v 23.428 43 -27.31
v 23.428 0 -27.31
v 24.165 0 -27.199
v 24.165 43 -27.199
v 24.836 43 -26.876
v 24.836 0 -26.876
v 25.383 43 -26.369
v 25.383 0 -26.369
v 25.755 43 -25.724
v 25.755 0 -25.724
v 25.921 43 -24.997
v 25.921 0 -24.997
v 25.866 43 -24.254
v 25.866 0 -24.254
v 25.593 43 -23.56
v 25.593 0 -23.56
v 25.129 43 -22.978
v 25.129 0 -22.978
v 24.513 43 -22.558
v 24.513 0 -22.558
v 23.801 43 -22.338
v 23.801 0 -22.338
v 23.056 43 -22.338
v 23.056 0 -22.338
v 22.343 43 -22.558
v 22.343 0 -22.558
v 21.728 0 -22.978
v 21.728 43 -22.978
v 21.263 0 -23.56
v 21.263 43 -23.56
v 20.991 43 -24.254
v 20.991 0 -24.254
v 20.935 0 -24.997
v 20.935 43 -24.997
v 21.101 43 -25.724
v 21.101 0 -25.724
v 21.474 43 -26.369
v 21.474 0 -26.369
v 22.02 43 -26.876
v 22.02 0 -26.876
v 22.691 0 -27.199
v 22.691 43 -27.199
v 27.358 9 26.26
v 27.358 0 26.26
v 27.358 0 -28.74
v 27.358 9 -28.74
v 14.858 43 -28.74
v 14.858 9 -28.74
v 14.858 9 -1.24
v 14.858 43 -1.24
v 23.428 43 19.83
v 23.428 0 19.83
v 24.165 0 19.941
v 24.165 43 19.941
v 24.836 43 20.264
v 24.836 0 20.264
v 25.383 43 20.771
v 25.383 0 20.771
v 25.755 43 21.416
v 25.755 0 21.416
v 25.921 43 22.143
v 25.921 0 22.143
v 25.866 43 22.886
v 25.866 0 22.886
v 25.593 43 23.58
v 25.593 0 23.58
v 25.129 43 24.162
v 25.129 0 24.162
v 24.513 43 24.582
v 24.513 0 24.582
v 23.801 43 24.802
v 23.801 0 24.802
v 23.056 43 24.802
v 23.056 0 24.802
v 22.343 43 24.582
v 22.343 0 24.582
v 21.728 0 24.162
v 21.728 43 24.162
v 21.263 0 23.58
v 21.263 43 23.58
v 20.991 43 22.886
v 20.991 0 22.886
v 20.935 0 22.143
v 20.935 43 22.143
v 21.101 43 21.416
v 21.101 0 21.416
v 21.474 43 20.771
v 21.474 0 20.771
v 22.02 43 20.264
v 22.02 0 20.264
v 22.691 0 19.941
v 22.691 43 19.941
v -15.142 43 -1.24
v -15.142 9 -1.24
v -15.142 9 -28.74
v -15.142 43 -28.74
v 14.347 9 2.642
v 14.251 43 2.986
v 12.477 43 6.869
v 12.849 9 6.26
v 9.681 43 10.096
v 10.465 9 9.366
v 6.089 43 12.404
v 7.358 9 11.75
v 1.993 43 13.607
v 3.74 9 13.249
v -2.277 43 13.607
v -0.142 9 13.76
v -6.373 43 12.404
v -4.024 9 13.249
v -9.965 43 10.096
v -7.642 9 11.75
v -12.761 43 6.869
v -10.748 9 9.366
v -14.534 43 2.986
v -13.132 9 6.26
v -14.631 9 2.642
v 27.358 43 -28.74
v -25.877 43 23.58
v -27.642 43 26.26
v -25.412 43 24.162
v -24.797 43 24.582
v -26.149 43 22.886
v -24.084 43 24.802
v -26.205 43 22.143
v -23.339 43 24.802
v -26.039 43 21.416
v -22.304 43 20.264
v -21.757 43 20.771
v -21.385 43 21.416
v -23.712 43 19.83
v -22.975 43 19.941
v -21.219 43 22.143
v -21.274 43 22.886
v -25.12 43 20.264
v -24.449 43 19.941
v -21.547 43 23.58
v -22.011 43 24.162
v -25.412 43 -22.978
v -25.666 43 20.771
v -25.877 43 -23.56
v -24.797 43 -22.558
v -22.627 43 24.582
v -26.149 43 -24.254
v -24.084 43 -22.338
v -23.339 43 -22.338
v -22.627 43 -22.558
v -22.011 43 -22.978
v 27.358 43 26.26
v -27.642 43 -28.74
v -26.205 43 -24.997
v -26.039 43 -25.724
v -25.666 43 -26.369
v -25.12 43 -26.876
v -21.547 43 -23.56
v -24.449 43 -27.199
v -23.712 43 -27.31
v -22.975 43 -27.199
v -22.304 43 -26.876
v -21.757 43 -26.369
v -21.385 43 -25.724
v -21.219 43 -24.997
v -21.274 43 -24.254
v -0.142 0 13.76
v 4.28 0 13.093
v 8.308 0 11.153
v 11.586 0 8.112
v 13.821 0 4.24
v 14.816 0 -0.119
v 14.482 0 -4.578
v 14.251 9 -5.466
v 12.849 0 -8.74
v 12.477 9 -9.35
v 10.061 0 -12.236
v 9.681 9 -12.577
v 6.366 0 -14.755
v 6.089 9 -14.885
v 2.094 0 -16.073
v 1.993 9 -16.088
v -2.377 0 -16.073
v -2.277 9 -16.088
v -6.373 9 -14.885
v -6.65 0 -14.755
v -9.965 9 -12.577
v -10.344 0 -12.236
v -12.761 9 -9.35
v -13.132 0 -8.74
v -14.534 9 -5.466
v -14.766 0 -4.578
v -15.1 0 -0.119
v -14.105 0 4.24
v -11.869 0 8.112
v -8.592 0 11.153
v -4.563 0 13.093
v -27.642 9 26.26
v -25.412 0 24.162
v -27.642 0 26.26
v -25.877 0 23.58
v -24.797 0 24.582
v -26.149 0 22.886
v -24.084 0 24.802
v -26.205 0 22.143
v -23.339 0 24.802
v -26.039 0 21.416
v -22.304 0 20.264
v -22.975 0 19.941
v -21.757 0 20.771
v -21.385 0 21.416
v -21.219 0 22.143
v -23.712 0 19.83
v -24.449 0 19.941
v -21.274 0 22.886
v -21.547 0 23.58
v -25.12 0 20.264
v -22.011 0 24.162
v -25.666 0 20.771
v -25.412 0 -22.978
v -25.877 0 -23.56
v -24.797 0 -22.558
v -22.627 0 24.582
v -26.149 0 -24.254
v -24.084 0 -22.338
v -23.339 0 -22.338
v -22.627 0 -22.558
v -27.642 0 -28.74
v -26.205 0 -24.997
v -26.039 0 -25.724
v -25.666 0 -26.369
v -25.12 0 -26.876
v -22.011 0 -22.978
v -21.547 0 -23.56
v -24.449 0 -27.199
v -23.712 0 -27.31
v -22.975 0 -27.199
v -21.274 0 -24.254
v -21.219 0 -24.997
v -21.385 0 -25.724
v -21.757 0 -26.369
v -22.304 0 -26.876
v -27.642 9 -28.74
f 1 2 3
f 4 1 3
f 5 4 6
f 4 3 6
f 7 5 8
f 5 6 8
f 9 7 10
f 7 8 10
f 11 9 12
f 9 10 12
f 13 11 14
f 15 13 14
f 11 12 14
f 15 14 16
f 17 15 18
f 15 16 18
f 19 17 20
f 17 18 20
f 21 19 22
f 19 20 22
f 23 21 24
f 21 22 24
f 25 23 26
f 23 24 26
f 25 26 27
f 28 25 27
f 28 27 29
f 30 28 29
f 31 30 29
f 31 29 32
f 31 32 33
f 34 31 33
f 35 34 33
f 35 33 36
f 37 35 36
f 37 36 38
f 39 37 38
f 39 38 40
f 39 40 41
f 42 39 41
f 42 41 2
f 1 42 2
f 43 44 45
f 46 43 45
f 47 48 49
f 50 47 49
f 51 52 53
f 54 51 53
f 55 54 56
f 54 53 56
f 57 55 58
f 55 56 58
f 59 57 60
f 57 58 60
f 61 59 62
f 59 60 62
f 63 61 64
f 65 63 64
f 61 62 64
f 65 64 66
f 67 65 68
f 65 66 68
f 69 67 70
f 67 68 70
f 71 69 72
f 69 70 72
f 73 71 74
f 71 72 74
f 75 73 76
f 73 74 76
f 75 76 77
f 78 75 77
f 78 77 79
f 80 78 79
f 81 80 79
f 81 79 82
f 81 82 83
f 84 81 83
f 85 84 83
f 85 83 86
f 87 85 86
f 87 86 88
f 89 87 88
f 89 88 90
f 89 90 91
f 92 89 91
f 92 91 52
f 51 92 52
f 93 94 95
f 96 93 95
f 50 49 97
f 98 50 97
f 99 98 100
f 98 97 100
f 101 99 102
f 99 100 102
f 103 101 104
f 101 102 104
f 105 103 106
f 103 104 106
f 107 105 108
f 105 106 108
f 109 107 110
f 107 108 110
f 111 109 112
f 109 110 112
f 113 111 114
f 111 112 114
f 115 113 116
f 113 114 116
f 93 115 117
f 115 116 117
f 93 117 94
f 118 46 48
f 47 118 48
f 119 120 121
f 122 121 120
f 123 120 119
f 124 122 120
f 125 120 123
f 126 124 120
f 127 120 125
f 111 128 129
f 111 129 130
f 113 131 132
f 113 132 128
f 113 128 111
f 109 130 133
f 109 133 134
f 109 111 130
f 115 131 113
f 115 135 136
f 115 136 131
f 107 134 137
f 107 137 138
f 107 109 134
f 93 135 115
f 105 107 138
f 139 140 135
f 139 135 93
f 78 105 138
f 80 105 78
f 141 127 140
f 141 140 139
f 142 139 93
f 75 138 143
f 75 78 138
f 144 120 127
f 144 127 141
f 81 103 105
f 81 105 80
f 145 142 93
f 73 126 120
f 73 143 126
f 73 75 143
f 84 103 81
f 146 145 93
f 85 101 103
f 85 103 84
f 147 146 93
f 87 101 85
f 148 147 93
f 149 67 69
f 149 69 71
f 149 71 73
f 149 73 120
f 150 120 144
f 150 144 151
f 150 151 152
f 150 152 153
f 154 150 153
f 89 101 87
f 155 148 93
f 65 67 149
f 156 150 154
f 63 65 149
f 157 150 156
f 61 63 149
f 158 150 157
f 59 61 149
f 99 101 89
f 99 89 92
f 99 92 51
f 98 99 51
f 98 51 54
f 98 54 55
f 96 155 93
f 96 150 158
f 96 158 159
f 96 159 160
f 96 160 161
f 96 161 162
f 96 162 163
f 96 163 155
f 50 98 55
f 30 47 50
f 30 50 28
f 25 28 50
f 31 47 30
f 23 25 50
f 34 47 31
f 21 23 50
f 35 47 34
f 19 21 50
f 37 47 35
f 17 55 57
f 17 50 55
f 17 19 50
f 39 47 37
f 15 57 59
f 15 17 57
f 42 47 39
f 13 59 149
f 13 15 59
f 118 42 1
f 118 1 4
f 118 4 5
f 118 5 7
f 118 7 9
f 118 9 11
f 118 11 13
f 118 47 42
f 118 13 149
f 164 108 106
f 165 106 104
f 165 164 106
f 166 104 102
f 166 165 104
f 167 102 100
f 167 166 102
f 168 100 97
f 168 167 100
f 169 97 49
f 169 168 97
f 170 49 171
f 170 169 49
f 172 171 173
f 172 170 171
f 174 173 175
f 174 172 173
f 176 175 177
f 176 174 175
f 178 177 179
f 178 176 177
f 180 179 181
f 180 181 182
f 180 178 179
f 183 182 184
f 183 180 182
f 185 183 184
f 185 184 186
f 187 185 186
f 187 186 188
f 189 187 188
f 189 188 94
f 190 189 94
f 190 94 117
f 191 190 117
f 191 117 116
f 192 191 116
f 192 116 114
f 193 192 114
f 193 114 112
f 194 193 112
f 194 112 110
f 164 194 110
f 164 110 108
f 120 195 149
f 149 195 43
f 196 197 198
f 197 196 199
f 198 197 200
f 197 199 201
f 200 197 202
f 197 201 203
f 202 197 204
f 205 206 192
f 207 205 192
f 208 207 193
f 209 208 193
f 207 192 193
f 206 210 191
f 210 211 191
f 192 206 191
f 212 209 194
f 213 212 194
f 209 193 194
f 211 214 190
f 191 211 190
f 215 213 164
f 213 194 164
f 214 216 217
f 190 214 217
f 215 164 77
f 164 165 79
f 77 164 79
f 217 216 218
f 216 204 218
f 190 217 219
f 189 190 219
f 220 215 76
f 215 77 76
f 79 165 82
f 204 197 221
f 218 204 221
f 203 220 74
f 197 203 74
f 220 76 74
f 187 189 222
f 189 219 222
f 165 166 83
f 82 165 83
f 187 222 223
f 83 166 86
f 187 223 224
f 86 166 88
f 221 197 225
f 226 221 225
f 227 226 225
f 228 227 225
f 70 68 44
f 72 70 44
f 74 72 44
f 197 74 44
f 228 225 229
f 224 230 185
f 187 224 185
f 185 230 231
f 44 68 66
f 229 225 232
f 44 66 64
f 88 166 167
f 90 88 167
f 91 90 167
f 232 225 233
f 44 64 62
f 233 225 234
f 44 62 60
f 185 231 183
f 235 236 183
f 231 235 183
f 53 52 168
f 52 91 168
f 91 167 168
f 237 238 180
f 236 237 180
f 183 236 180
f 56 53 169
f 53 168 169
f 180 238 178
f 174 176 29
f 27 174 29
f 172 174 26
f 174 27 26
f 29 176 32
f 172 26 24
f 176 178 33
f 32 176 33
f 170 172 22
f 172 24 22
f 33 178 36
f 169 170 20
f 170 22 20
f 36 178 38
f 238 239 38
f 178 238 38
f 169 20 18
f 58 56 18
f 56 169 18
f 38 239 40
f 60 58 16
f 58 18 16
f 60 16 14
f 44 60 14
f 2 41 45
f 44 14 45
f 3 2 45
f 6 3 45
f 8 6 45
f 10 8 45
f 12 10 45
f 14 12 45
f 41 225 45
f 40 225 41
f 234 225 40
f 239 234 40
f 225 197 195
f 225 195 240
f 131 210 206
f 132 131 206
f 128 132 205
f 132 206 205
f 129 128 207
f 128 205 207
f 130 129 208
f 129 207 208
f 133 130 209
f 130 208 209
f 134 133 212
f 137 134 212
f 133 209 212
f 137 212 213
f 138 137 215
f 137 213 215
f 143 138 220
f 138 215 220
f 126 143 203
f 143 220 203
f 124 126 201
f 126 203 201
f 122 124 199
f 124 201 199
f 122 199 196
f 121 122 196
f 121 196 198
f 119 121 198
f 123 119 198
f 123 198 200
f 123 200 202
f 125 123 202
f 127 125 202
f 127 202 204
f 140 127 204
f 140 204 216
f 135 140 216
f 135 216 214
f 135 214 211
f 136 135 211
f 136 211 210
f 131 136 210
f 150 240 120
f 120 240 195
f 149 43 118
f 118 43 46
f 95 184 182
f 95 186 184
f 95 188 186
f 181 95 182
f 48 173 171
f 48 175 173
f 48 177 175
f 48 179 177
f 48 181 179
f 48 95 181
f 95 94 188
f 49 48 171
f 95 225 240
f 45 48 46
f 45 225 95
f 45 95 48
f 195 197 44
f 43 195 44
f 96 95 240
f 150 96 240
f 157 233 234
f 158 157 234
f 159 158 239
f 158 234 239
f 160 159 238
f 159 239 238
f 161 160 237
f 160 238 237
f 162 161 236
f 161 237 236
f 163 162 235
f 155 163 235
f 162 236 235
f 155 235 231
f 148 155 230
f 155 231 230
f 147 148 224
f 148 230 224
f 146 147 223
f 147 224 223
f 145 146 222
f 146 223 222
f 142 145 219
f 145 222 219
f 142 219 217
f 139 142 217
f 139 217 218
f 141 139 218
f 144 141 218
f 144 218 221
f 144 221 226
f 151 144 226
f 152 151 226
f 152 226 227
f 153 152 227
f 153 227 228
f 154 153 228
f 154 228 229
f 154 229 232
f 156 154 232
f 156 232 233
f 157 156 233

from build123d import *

# Parameters (mm, degrees)
SKETCH1_W           = 55
SKETCH1_H           = 55
SKETCH1_R           = 15
BOSS_EXTRUDE3_DEPTH = 9
BOSS_EXTRUDE4_DEPTH = 34
CUT_EXTRUDE1_REACH  = 60.644
SKETCH6_R           = 2.5


with BuildPart() as part:
    # Sketch1 → Boss-Extrude3 (new body)
    with BuildSketch(Plane(origin=(0, 0, 0), x_dir=(1, 0, 0), z_dir=(0, 1, 0))):
        with Locations((-0.141805914, 1.240284381)):
            Rectangle(SKETCH1_W, SKETCH1_H)
        with Locations(Location((-0.141805914, 1.240284381, 0), (0, 0, 270))):
            Circle(SKETCH1_R, mode=Mode.SUBTRACT)
    extrude(amount=BOSS_EXTRUDE3_DEPTH)

    # Sketch5 → Boss-Extrude4 (add)
    with BuildSketch(Plane(origin=(0, 9, 0), x_dir=(1, 0, 0), z_dir=(0, 1, 0))):
        with BuildLine():
            ThreePointArc((14.858194086, 1.240284381), (-0.141805914, -13.759715619), (-15.141805914, 1.240284381))
            Line((-15.141805914, 1.240284381), (-15.141805914, 28.740284381))
            Line((-15.141805914, 28.740284381), (-27.641805914, 28.740284381))
            Line((-27.641805914, 28.740284381), (-27.641805914, -26.259715619))
            Line((-27.641805914, -26.259715619), (27.358194086, -26.259715619))
            Line((27.358194086, -26.259715619), (27.358194086, 28.740284381))
            Line((27.358194086, 28.740284381), (14.858194086, 28.740284381))
            Line((14.858194086, 28.740284381), (14.858194086, 1.240284381))
        make_face()
    extrude(amount=BOSS_EXTRUDE4_DEPTH)

    # Sketch6 → Cut-Extrude1 (cut, up to next)
    with BuildSketch(Plane.XZ, mode=Mode.PRIVATE) as cut_extrude1_sk1:
        with Locations(Location((-23.711805914, 22.329715619, 0), (0, 0, 270))):
            Circle(SKETCH6_R)
    cut_extrude1_tool1 = extrude(cut_extrude1_sk1.sketch, amount=-CUT_EXTRUDE1_REACH, mode=Mode.PRIVATE) & part.part
    # Sketch6 → Cut-Extrude1 (cut, up to next)
    with BuildSketch(Plane.XZ, mode=Mode.PRIVATE) as cut_extrude1_sk2:
        with Locations(Location((23.428194086, 22.329715619, 0), (0, 0, 270))):
            Circle(SKETCH6_R)
    cut_extrude1_tool2 = extrude(cut_extrude1_sk2.sketch, amount=-CUT_EXTRUDE1_REACH, mode=Mode.PRIVATE) & part.part
    # Sketch6 → Cut-Extrude1 (cut, up to next)
    with BuildSketch(Plane.XZ, mode=Mode.PRIVATE) as cut_extrude1_sk3:
        with Locations(Location((-23.711805914, -24.810284381, 0), (0, 0, 270))):
            Circle(SKETCH6_R)
    cut_extrude1_tool3 = extrude(cut_extrude1_sk3.sketch, amount=-CUT_EXTRUDE1_REACH, mode=Mode.PRIVATE) & part.part
    # Sketch6 → Cut-Extrude1 (cut, up to next)
    with BuildSketch(Plane.XZ, mode=Mode.PRIVATE) as cut_extrude1_sk4:
        with Locations(Location((23.428194086, -24.810284381, 0), (0, 0, 270))):
            Circle(SKETCH6_R)
    cut_extrude1_tool4 = extrude(cut_extrude1_sk4.sketch, amount=-CUT_EXTRUDE1_REACH, mode=Mode.PRIVATE) & part.part
    add(cut_extrude1_tool1.solids().sort_by_distance((-23.711806, 0, 22.329716))[0], mode=Mode.SUBTRACT)
    add(cut_extrude1_tool2.solids().sort_by_distance((23.428194, 0, 22.329716))[0], mode=Mode.SUBTRACT)
    add(cut_extrude1_tool3.solids().sort_by_distance((-23.711806, 0, -24.810284))[0], mode=Mode.SUBTRACT)
    add(cut_extrude1_tool4.solids().sort_by_distance((23.428194, 0, -24.810284))[0], mode=Mode.SUBTRACT)


solid = part.part
